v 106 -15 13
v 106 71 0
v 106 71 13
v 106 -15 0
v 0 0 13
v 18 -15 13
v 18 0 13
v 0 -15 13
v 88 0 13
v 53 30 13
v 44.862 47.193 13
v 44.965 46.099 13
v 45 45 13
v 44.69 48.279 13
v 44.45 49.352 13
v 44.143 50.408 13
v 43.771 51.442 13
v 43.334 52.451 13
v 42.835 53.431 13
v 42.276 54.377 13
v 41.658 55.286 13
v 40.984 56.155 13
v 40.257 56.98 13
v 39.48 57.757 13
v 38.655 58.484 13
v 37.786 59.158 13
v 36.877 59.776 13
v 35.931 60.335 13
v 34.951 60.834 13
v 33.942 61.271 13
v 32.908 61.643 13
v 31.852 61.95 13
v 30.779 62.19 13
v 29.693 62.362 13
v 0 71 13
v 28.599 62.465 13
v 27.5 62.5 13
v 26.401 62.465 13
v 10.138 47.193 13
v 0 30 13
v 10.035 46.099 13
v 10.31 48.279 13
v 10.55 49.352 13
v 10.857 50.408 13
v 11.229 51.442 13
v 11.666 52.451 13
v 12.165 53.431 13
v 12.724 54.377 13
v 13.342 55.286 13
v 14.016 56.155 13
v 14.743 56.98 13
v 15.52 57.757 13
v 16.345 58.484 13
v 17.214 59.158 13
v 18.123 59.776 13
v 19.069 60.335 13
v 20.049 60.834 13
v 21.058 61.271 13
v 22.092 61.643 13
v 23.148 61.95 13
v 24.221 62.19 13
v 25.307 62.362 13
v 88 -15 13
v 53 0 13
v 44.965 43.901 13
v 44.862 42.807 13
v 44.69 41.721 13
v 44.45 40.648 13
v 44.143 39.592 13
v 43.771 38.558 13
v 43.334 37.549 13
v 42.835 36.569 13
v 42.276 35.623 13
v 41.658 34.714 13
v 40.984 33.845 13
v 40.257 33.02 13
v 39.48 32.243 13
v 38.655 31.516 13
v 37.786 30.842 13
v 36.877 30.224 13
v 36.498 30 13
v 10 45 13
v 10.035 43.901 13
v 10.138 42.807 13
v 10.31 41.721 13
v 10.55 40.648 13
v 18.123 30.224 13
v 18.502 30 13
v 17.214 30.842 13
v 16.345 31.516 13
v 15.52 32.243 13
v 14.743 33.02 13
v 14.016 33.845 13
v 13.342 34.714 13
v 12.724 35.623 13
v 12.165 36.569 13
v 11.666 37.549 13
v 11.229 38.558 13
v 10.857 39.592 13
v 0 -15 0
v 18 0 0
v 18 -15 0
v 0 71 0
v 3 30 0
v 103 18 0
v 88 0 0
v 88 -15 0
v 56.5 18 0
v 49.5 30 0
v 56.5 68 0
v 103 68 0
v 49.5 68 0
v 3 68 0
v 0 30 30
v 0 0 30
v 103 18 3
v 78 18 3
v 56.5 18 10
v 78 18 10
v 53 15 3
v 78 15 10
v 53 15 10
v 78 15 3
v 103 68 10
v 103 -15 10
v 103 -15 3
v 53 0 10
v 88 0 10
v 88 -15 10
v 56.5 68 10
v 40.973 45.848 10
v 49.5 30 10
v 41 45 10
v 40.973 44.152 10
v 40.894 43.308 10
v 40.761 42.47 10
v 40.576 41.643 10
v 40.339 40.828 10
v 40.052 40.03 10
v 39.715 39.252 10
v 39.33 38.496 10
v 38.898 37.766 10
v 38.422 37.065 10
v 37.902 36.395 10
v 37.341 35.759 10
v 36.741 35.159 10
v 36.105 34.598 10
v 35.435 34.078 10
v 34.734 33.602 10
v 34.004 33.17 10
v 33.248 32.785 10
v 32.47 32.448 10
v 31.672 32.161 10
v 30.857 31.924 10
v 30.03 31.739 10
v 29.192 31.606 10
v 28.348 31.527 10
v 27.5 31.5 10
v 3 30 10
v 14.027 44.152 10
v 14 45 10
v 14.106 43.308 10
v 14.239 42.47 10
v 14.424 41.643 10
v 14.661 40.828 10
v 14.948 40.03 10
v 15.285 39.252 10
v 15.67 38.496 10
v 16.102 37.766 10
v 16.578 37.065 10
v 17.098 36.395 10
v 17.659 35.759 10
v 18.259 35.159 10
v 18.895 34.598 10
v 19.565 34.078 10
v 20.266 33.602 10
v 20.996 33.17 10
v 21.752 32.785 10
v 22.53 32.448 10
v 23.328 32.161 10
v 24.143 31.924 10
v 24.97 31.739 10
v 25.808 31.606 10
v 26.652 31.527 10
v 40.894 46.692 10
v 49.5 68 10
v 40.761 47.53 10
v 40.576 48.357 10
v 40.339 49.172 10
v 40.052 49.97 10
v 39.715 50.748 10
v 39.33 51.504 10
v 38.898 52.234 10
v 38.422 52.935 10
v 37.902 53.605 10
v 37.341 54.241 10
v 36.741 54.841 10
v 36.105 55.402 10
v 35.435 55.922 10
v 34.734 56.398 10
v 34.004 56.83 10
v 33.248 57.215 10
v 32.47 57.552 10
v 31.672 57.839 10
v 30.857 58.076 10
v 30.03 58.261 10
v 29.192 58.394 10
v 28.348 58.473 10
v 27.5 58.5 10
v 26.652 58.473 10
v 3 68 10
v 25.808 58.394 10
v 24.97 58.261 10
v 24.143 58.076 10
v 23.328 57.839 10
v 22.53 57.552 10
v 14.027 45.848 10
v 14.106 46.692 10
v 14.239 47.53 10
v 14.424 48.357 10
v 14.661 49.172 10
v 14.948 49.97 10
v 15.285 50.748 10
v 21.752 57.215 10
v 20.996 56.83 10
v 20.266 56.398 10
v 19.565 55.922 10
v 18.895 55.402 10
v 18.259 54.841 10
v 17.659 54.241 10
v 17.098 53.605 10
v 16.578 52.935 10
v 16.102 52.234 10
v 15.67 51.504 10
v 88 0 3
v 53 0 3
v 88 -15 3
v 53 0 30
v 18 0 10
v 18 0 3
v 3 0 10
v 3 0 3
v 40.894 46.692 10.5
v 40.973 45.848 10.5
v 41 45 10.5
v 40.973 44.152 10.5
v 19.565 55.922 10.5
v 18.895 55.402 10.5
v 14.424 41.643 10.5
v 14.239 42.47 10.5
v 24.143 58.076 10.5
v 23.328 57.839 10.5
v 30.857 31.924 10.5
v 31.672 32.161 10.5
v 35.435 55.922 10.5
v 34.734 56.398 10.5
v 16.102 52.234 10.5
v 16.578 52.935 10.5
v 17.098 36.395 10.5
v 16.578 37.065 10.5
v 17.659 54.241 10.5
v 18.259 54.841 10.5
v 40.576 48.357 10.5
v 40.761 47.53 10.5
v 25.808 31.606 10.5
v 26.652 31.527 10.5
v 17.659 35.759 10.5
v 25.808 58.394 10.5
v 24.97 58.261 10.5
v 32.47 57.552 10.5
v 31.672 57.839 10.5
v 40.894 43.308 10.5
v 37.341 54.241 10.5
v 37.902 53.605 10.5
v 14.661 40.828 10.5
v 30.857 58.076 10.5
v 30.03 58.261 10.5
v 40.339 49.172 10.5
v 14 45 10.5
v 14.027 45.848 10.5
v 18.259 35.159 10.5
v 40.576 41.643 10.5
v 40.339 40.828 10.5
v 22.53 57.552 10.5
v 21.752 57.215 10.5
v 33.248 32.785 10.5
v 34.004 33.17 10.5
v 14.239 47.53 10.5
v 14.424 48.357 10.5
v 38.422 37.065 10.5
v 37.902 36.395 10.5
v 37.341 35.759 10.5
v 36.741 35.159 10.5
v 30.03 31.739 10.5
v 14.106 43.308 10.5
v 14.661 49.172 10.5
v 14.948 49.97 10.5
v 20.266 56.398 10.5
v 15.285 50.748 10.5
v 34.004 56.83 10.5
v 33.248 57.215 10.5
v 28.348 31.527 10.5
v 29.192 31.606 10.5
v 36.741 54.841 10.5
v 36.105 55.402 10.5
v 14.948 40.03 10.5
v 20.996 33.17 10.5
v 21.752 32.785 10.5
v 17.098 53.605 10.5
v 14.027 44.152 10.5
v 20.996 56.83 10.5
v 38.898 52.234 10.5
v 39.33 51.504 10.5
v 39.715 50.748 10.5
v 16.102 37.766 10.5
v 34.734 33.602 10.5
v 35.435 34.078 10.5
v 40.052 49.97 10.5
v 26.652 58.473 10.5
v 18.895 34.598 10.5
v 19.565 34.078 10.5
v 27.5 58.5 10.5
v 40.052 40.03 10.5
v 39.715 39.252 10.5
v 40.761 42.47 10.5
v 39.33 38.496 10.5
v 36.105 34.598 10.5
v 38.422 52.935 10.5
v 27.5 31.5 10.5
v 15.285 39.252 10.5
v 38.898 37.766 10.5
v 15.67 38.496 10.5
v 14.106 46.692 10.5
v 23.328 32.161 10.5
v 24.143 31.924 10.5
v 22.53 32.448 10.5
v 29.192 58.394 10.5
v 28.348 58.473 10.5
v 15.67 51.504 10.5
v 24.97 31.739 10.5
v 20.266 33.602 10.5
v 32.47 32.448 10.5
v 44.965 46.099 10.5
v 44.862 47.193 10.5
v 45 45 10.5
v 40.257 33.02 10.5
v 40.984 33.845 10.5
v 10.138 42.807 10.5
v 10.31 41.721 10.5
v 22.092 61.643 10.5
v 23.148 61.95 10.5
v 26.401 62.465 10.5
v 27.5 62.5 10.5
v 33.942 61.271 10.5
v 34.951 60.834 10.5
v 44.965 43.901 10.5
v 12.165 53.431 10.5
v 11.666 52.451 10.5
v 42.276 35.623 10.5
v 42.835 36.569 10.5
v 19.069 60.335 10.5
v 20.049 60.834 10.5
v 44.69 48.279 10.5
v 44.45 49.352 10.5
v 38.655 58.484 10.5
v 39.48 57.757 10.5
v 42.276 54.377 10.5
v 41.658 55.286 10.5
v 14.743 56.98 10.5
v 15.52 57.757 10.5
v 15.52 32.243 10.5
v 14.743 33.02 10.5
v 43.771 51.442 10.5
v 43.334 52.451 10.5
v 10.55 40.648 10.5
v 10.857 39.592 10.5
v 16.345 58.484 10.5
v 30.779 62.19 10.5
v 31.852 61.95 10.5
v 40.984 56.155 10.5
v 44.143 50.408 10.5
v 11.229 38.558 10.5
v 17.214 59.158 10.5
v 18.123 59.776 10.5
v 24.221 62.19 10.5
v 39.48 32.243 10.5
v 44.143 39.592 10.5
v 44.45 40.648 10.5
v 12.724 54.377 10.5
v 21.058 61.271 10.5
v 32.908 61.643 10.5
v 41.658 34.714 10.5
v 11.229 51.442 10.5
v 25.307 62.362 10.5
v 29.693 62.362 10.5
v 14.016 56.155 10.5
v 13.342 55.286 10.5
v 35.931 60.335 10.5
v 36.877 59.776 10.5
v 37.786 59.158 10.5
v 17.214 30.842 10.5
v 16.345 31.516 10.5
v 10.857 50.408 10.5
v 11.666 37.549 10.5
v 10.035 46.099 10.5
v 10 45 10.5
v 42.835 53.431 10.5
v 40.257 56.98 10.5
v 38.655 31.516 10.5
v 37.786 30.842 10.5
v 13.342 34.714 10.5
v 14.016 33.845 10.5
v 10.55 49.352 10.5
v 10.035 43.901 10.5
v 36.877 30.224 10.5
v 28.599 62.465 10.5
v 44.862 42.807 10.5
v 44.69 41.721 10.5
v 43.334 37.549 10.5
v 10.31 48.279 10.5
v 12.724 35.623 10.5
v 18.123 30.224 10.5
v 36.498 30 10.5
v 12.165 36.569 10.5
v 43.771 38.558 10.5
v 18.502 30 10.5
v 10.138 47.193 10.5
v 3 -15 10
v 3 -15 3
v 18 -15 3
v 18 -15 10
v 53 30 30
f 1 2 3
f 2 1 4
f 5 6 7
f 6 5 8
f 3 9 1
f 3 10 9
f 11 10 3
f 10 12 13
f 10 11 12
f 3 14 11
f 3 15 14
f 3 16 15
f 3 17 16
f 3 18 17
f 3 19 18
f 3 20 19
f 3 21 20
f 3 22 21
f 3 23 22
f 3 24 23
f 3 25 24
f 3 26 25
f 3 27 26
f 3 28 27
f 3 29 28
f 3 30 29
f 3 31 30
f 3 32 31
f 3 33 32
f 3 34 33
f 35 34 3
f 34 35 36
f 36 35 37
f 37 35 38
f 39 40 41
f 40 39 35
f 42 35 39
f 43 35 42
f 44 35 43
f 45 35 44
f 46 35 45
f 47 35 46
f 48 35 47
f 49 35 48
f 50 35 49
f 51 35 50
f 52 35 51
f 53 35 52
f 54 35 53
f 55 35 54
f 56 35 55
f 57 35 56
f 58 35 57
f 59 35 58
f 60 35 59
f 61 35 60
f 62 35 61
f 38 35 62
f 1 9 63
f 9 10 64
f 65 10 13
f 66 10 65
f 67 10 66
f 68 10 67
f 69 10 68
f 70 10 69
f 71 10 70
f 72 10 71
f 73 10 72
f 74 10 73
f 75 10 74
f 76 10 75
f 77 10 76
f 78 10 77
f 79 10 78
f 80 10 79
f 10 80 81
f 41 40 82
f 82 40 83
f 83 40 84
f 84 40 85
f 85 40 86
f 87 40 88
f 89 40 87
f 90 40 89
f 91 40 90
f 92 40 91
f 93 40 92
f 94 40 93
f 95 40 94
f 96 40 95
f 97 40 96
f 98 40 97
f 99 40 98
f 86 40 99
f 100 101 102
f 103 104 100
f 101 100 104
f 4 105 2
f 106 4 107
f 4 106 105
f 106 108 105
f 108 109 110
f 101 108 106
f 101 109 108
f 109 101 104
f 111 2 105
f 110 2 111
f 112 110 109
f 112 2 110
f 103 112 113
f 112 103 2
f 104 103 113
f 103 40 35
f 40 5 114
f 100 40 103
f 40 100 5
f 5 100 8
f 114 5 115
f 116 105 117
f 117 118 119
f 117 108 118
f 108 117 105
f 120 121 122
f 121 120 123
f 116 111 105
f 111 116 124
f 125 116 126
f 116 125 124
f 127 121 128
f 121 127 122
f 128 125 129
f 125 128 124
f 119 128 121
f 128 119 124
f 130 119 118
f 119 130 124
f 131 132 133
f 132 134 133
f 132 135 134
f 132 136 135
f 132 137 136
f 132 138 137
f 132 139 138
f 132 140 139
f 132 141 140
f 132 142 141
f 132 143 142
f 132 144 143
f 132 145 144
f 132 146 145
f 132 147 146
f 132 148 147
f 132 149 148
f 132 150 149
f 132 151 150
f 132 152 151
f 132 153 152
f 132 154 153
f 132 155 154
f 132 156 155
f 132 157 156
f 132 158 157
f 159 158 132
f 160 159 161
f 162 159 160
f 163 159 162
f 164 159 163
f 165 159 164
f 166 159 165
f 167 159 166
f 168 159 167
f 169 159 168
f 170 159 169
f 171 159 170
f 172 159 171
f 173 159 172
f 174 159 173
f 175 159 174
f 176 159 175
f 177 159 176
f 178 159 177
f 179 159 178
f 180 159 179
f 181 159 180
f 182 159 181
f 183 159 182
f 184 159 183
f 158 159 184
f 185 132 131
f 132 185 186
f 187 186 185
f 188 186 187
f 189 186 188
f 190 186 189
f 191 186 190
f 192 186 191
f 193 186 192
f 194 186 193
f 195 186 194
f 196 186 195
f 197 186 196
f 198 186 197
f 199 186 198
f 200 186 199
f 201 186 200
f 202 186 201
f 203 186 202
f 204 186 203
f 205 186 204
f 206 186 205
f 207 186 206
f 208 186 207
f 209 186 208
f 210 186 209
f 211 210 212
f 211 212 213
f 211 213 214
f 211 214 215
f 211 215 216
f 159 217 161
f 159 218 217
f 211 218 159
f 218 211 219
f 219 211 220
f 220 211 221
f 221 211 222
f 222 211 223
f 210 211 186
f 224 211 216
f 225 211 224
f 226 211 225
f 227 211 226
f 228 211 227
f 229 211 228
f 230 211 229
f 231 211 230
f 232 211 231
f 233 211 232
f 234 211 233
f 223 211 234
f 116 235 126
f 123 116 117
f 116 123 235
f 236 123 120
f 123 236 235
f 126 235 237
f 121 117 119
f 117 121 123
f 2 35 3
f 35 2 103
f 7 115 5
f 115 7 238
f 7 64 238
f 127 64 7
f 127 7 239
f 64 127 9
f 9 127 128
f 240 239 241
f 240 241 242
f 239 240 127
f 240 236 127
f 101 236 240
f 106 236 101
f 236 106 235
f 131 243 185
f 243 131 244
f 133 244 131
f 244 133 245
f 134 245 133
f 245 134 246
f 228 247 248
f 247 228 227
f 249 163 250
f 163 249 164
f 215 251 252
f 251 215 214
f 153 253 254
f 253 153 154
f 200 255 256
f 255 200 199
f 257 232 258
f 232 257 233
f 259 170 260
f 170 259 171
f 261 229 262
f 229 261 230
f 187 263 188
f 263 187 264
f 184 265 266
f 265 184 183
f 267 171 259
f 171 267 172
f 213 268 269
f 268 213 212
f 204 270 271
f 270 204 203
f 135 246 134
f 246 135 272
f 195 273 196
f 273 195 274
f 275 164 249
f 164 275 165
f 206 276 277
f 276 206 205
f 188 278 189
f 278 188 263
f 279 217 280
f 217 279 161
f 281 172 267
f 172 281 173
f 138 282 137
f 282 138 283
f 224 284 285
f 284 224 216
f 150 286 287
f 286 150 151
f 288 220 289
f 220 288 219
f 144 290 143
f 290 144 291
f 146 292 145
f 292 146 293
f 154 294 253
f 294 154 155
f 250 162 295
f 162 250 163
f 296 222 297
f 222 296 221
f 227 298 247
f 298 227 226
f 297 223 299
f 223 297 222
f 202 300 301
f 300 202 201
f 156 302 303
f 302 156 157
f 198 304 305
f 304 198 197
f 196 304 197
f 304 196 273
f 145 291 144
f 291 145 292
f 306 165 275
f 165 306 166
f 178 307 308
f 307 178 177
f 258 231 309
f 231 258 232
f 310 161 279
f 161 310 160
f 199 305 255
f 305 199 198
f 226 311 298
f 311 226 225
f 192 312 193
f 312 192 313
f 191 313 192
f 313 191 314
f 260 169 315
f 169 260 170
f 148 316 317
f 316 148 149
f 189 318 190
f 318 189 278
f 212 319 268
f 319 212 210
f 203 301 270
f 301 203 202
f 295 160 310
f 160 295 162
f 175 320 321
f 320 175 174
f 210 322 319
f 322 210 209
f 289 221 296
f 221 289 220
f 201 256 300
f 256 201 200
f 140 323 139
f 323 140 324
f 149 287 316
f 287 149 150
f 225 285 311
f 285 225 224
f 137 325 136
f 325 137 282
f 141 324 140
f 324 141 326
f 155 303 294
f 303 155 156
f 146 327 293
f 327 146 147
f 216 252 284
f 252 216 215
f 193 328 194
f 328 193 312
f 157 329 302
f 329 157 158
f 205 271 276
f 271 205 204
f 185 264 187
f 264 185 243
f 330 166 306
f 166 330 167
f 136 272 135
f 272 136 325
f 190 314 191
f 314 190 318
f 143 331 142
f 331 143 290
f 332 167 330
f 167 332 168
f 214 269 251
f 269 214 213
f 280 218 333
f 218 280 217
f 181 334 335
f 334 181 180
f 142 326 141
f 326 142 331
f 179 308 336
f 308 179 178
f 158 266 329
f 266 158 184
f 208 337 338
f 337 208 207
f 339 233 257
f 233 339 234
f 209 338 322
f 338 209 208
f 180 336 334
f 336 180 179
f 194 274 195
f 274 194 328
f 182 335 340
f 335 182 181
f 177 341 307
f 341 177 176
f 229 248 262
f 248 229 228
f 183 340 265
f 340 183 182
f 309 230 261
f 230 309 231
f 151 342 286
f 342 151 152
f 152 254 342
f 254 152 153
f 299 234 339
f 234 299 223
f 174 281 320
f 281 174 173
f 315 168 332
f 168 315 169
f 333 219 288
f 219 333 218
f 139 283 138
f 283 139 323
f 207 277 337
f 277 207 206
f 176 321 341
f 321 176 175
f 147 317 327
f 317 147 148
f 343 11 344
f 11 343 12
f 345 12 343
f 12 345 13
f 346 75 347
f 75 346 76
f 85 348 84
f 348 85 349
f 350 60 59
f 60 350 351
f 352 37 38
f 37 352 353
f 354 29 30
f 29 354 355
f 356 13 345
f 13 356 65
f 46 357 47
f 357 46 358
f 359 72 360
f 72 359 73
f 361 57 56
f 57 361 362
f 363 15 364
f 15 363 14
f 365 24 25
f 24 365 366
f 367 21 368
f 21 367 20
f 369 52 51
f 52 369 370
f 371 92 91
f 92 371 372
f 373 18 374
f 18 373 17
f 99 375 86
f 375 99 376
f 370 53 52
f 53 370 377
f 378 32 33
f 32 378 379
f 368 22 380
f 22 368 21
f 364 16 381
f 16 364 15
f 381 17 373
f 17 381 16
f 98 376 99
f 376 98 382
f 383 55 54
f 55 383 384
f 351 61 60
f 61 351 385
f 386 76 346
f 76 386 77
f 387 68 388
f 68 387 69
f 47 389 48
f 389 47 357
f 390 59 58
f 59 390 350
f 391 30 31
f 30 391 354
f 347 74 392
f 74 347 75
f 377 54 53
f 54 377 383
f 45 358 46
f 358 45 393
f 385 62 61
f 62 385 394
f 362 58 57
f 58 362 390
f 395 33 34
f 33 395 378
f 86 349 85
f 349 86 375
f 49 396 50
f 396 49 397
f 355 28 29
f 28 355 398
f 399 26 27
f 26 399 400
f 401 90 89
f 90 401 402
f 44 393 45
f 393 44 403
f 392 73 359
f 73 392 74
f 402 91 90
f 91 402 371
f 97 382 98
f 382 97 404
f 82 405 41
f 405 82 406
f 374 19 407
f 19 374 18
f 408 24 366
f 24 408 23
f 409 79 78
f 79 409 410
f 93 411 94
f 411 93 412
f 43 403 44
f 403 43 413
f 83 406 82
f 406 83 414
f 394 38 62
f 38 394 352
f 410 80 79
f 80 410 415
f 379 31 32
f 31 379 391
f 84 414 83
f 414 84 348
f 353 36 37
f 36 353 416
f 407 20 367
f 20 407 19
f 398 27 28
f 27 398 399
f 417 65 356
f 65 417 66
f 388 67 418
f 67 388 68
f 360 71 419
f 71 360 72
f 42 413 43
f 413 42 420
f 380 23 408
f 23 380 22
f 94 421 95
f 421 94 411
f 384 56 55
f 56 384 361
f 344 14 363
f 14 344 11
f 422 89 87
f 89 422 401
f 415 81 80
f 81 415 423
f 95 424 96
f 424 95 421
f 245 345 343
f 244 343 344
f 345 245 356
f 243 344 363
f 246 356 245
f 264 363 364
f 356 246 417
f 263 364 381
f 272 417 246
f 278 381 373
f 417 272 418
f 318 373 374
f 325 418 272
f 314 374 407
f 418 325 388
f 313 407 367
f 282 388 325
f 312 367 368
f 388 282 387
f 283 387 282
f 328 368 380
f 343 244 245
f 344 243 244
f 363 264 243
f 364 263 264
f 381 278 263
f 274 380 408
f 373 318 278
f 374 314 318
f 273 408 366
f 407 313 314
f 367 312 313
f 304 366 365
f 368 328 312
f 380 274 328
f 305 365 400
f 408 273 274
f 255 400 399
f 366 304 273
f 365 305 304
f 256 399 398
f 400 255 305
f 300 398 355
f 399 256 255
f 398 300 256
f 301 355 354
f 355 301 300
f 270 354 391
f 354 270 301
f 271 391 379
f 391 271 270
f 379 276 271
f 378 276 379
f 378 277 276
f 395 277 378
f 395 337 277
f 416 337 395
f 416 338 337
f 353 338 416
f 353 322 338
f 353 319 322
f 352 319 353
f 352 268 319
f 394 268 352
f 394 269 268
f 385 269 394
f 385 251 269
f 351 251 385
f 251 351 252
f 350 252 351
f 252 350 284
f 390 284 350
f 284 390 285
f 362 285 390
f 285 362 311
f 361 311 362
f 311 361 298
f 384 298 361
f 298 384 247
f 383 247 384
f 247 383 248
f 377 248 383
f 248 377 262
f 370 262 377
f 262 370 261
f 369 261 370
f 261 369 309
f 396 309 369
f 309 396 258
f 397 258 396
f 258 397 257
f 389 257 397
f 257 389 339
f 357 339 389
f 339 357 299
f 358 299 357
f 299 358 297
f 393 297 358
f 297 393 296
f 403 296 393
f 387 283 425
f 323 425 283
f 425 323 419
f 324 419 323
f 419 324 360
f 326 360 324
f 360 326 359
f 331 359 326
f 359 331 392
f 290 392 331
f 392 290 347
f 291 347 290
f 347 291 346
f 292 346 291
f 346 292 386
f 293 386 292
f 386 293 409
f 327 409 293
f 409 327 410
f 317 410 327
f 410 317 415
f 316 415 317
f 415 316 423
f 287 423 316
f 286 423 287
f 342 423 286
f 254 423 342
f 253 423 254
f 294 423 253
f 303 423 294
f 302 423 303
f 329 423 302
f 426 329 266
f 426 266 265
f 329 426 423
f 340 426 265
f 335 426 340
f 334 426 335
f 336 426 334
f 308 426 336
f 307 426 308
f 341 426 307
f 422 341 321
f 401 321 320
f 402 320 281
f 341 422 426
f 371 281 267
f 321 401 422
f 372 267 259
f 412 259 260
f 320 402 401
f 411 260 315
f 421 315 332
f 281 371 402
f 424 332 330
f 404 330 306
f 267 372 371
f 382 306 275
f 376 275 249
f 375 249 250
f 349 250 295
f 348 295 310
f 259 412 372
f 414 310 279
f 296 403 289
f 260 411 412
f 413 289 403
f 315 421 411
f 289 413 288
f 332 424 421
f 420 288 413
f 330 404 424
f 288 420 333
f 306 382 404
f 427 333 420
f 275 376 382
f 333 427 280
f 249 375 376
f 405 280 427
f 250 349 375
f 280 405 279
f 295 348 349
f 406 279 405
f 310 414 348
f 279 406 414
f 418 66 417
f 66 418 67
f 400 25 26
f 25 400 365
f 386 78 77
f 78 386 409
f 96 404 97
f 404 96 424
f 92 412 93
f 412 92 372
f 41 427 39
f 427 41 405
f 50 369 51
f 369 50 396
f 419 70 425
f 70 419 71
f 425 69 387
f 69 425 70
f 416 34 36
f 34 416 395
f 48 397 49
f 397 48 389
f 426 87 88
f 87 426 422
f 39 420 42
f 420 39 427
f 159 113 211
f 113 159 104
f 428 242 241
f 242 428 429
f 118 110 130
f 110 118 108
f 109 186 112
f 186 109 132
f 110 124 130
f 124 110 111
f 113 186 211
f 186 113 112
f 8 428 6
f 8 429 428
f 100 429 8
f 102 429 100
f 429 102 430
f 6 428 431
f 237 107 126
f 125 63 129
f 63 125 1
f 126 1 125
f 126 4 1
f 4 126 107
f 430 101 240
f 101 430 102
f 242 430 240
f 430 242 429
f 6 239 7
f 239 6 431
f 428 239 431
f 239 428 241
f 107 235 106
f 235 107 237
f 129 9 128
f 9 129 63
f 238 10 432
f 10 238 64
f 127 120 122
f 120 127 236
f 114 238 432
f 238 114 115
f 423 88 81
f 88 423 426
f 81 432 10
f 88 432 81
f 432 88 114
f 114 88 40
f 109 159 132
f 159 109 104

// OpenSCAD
//Este codigo es como hacer un clip que se ajusta automaticamente a un acrilico de un espesor z, un largo x a una profunidad y.Generalmente usamos el espesor del acrilico mas 1mm (grosor papel). Ademas se puede prolongar hasta una determinado extra para mayor presion. Con paredes de espesor de 3.
//input
//Medidas acrilico
eAc = 3; //espesor del acrilico
aAc = 100; //ancho del acrilico
iAc = 25; //medidas del inserto de acrilico en el dispositivo.
//Medidas impresion 3D
gp3D = 3; // grosor de la pared impresa en 3D
c3D = 15; //cobertura del plastico que esta superpuesto al acrilico
re3D = 17.5; //radio externo del filtro
ri3D = 13.5; //radio interno del filtro
em3D = 2; //embutido del filtro en la pared 3D
//Medidas extensiones, son utiles para aumentar la superficie de contacto que alica presion sobre el extremo del acrilico.
pEx = 15; //protrusion de la extension desde el final del cuerpo mayor, cuando sale la extension. Suele ser similar al c3D.
aEx = 15; //ancho de la protusion del cuerpo mayor. Suele ser similar al c3D.
//Medidas papel
ePa = 1; //espesor del papel. Considerado para la presion que hara el clip sobre este. Suele ser consierado como 1mm.

//Medidas Source
lSo = 50; //largo de la fuente.
aSo = aAc; //ancho de la fuente. Modificable aunque suele ser del ancho del acrilico.

//output
//Medidas del clip
xPl = gp3D; // componente de la pared lateral en el eje x.
yPl = gp3D + c3D; // componente de la pared lateral en el eje y.
zPl = 2*eAc + 2*gp3D + ePa; // componente de la pared lateral en el eje z.
xPp = aAc + 2*gp3D; // componente de la pared posterior en el eje x.
yPp = gp3D; // componente de la pared posterior en el eje y.
zPp = zPl; // componente de la pared posterior en el eje z.
xPs = xPp; // componente de la pared superior en el eje x.
yPs = yPl; // componente de la pared superior en el eje y.
zPs = gp3D; // componente de la pared superior en el eje z.

//Paredes laterales vistas de frente.
cube([xPl,(yPl + lSo + gp3D),zPl]);
translate([(gp3D+aAc),0,0]) 
    cube([xPl,(yPl + lSo + gp3D),zPl]);
translate([((aAc/2)) - 0.5,c3D,0]) //0.5 es la mitad del 1 mm que dejaremos como libertad entre fuentes
    cube([xPl*2 + 1,(lSo + 2*gp3D),zPl]);

//Pared posterior
difference(){
    translate([0,(c3D),0]) 
cube([xPp,yPp,zPp]);
    translate([gp3D,(c3D),gp3D]) 
cube([iAc,(gp3D + 6),(eAc*2 + ePa)]);
    translate([xPs - (3 + iAc) ,(c3D),gp3D]) 
cube([iAc,(gp3D + 6),(eAc*2 + ePa)]);
 
}
translate([0,(lSo + c3D + gp3D),0]) 
    cube([xPp,yPp,zPp]);    
    
    
//Paredes superior e inferior vistas de frente.
cube([xPs,yPs,zPs]);
difference(){
    translate([0,0,(zPl-gp3D)]) 
cube([xPs,(yPs + lSo + gp3D),zPs]); 
    translate([27.5,45,0]) 
cylinder(r=ri3D,h=100, $fn=100, center= true);  
    translate([27.5,45,13]) 
cylinder(r=re3D,h=5, $fn=100, center= true);   
}  
//Extensiones
//Paredes laterales de las extenciones.
translate([0,-pEx,0]) //se traslada en y el valor negativo de su protrusion.
    cube([xPl,pEx,zPl]);
translate([(gp3D+aAc),-pEx,0]) // se traslada en x lo mismo que la pared lateral.
    cube([xPl,pEx,zPl]);

//Paredes superiores de las extenciones
translate([0,-pEx,0]) //se traslada en y el valor negativo de su protrusion.
    cube([(aEx + gp3D),pEx,gp3D]);
translate([0,-pEx,(zPl-gp3D)])
    cube([(aEx + gp3D),pEx,gp3D]);
translate([(aAc + gp3D - aEx),-pEx,0])
    cube([(aEx + gp3D),pEx,gp3D]);
translate([(aAc + gp3D - aEx),-pEx,(zPl-gp3D)])
    cube([(aEx + gp3D),pEx,gp3D]);

//testercube
color("blue")
cube([(3+50),30,30]);
